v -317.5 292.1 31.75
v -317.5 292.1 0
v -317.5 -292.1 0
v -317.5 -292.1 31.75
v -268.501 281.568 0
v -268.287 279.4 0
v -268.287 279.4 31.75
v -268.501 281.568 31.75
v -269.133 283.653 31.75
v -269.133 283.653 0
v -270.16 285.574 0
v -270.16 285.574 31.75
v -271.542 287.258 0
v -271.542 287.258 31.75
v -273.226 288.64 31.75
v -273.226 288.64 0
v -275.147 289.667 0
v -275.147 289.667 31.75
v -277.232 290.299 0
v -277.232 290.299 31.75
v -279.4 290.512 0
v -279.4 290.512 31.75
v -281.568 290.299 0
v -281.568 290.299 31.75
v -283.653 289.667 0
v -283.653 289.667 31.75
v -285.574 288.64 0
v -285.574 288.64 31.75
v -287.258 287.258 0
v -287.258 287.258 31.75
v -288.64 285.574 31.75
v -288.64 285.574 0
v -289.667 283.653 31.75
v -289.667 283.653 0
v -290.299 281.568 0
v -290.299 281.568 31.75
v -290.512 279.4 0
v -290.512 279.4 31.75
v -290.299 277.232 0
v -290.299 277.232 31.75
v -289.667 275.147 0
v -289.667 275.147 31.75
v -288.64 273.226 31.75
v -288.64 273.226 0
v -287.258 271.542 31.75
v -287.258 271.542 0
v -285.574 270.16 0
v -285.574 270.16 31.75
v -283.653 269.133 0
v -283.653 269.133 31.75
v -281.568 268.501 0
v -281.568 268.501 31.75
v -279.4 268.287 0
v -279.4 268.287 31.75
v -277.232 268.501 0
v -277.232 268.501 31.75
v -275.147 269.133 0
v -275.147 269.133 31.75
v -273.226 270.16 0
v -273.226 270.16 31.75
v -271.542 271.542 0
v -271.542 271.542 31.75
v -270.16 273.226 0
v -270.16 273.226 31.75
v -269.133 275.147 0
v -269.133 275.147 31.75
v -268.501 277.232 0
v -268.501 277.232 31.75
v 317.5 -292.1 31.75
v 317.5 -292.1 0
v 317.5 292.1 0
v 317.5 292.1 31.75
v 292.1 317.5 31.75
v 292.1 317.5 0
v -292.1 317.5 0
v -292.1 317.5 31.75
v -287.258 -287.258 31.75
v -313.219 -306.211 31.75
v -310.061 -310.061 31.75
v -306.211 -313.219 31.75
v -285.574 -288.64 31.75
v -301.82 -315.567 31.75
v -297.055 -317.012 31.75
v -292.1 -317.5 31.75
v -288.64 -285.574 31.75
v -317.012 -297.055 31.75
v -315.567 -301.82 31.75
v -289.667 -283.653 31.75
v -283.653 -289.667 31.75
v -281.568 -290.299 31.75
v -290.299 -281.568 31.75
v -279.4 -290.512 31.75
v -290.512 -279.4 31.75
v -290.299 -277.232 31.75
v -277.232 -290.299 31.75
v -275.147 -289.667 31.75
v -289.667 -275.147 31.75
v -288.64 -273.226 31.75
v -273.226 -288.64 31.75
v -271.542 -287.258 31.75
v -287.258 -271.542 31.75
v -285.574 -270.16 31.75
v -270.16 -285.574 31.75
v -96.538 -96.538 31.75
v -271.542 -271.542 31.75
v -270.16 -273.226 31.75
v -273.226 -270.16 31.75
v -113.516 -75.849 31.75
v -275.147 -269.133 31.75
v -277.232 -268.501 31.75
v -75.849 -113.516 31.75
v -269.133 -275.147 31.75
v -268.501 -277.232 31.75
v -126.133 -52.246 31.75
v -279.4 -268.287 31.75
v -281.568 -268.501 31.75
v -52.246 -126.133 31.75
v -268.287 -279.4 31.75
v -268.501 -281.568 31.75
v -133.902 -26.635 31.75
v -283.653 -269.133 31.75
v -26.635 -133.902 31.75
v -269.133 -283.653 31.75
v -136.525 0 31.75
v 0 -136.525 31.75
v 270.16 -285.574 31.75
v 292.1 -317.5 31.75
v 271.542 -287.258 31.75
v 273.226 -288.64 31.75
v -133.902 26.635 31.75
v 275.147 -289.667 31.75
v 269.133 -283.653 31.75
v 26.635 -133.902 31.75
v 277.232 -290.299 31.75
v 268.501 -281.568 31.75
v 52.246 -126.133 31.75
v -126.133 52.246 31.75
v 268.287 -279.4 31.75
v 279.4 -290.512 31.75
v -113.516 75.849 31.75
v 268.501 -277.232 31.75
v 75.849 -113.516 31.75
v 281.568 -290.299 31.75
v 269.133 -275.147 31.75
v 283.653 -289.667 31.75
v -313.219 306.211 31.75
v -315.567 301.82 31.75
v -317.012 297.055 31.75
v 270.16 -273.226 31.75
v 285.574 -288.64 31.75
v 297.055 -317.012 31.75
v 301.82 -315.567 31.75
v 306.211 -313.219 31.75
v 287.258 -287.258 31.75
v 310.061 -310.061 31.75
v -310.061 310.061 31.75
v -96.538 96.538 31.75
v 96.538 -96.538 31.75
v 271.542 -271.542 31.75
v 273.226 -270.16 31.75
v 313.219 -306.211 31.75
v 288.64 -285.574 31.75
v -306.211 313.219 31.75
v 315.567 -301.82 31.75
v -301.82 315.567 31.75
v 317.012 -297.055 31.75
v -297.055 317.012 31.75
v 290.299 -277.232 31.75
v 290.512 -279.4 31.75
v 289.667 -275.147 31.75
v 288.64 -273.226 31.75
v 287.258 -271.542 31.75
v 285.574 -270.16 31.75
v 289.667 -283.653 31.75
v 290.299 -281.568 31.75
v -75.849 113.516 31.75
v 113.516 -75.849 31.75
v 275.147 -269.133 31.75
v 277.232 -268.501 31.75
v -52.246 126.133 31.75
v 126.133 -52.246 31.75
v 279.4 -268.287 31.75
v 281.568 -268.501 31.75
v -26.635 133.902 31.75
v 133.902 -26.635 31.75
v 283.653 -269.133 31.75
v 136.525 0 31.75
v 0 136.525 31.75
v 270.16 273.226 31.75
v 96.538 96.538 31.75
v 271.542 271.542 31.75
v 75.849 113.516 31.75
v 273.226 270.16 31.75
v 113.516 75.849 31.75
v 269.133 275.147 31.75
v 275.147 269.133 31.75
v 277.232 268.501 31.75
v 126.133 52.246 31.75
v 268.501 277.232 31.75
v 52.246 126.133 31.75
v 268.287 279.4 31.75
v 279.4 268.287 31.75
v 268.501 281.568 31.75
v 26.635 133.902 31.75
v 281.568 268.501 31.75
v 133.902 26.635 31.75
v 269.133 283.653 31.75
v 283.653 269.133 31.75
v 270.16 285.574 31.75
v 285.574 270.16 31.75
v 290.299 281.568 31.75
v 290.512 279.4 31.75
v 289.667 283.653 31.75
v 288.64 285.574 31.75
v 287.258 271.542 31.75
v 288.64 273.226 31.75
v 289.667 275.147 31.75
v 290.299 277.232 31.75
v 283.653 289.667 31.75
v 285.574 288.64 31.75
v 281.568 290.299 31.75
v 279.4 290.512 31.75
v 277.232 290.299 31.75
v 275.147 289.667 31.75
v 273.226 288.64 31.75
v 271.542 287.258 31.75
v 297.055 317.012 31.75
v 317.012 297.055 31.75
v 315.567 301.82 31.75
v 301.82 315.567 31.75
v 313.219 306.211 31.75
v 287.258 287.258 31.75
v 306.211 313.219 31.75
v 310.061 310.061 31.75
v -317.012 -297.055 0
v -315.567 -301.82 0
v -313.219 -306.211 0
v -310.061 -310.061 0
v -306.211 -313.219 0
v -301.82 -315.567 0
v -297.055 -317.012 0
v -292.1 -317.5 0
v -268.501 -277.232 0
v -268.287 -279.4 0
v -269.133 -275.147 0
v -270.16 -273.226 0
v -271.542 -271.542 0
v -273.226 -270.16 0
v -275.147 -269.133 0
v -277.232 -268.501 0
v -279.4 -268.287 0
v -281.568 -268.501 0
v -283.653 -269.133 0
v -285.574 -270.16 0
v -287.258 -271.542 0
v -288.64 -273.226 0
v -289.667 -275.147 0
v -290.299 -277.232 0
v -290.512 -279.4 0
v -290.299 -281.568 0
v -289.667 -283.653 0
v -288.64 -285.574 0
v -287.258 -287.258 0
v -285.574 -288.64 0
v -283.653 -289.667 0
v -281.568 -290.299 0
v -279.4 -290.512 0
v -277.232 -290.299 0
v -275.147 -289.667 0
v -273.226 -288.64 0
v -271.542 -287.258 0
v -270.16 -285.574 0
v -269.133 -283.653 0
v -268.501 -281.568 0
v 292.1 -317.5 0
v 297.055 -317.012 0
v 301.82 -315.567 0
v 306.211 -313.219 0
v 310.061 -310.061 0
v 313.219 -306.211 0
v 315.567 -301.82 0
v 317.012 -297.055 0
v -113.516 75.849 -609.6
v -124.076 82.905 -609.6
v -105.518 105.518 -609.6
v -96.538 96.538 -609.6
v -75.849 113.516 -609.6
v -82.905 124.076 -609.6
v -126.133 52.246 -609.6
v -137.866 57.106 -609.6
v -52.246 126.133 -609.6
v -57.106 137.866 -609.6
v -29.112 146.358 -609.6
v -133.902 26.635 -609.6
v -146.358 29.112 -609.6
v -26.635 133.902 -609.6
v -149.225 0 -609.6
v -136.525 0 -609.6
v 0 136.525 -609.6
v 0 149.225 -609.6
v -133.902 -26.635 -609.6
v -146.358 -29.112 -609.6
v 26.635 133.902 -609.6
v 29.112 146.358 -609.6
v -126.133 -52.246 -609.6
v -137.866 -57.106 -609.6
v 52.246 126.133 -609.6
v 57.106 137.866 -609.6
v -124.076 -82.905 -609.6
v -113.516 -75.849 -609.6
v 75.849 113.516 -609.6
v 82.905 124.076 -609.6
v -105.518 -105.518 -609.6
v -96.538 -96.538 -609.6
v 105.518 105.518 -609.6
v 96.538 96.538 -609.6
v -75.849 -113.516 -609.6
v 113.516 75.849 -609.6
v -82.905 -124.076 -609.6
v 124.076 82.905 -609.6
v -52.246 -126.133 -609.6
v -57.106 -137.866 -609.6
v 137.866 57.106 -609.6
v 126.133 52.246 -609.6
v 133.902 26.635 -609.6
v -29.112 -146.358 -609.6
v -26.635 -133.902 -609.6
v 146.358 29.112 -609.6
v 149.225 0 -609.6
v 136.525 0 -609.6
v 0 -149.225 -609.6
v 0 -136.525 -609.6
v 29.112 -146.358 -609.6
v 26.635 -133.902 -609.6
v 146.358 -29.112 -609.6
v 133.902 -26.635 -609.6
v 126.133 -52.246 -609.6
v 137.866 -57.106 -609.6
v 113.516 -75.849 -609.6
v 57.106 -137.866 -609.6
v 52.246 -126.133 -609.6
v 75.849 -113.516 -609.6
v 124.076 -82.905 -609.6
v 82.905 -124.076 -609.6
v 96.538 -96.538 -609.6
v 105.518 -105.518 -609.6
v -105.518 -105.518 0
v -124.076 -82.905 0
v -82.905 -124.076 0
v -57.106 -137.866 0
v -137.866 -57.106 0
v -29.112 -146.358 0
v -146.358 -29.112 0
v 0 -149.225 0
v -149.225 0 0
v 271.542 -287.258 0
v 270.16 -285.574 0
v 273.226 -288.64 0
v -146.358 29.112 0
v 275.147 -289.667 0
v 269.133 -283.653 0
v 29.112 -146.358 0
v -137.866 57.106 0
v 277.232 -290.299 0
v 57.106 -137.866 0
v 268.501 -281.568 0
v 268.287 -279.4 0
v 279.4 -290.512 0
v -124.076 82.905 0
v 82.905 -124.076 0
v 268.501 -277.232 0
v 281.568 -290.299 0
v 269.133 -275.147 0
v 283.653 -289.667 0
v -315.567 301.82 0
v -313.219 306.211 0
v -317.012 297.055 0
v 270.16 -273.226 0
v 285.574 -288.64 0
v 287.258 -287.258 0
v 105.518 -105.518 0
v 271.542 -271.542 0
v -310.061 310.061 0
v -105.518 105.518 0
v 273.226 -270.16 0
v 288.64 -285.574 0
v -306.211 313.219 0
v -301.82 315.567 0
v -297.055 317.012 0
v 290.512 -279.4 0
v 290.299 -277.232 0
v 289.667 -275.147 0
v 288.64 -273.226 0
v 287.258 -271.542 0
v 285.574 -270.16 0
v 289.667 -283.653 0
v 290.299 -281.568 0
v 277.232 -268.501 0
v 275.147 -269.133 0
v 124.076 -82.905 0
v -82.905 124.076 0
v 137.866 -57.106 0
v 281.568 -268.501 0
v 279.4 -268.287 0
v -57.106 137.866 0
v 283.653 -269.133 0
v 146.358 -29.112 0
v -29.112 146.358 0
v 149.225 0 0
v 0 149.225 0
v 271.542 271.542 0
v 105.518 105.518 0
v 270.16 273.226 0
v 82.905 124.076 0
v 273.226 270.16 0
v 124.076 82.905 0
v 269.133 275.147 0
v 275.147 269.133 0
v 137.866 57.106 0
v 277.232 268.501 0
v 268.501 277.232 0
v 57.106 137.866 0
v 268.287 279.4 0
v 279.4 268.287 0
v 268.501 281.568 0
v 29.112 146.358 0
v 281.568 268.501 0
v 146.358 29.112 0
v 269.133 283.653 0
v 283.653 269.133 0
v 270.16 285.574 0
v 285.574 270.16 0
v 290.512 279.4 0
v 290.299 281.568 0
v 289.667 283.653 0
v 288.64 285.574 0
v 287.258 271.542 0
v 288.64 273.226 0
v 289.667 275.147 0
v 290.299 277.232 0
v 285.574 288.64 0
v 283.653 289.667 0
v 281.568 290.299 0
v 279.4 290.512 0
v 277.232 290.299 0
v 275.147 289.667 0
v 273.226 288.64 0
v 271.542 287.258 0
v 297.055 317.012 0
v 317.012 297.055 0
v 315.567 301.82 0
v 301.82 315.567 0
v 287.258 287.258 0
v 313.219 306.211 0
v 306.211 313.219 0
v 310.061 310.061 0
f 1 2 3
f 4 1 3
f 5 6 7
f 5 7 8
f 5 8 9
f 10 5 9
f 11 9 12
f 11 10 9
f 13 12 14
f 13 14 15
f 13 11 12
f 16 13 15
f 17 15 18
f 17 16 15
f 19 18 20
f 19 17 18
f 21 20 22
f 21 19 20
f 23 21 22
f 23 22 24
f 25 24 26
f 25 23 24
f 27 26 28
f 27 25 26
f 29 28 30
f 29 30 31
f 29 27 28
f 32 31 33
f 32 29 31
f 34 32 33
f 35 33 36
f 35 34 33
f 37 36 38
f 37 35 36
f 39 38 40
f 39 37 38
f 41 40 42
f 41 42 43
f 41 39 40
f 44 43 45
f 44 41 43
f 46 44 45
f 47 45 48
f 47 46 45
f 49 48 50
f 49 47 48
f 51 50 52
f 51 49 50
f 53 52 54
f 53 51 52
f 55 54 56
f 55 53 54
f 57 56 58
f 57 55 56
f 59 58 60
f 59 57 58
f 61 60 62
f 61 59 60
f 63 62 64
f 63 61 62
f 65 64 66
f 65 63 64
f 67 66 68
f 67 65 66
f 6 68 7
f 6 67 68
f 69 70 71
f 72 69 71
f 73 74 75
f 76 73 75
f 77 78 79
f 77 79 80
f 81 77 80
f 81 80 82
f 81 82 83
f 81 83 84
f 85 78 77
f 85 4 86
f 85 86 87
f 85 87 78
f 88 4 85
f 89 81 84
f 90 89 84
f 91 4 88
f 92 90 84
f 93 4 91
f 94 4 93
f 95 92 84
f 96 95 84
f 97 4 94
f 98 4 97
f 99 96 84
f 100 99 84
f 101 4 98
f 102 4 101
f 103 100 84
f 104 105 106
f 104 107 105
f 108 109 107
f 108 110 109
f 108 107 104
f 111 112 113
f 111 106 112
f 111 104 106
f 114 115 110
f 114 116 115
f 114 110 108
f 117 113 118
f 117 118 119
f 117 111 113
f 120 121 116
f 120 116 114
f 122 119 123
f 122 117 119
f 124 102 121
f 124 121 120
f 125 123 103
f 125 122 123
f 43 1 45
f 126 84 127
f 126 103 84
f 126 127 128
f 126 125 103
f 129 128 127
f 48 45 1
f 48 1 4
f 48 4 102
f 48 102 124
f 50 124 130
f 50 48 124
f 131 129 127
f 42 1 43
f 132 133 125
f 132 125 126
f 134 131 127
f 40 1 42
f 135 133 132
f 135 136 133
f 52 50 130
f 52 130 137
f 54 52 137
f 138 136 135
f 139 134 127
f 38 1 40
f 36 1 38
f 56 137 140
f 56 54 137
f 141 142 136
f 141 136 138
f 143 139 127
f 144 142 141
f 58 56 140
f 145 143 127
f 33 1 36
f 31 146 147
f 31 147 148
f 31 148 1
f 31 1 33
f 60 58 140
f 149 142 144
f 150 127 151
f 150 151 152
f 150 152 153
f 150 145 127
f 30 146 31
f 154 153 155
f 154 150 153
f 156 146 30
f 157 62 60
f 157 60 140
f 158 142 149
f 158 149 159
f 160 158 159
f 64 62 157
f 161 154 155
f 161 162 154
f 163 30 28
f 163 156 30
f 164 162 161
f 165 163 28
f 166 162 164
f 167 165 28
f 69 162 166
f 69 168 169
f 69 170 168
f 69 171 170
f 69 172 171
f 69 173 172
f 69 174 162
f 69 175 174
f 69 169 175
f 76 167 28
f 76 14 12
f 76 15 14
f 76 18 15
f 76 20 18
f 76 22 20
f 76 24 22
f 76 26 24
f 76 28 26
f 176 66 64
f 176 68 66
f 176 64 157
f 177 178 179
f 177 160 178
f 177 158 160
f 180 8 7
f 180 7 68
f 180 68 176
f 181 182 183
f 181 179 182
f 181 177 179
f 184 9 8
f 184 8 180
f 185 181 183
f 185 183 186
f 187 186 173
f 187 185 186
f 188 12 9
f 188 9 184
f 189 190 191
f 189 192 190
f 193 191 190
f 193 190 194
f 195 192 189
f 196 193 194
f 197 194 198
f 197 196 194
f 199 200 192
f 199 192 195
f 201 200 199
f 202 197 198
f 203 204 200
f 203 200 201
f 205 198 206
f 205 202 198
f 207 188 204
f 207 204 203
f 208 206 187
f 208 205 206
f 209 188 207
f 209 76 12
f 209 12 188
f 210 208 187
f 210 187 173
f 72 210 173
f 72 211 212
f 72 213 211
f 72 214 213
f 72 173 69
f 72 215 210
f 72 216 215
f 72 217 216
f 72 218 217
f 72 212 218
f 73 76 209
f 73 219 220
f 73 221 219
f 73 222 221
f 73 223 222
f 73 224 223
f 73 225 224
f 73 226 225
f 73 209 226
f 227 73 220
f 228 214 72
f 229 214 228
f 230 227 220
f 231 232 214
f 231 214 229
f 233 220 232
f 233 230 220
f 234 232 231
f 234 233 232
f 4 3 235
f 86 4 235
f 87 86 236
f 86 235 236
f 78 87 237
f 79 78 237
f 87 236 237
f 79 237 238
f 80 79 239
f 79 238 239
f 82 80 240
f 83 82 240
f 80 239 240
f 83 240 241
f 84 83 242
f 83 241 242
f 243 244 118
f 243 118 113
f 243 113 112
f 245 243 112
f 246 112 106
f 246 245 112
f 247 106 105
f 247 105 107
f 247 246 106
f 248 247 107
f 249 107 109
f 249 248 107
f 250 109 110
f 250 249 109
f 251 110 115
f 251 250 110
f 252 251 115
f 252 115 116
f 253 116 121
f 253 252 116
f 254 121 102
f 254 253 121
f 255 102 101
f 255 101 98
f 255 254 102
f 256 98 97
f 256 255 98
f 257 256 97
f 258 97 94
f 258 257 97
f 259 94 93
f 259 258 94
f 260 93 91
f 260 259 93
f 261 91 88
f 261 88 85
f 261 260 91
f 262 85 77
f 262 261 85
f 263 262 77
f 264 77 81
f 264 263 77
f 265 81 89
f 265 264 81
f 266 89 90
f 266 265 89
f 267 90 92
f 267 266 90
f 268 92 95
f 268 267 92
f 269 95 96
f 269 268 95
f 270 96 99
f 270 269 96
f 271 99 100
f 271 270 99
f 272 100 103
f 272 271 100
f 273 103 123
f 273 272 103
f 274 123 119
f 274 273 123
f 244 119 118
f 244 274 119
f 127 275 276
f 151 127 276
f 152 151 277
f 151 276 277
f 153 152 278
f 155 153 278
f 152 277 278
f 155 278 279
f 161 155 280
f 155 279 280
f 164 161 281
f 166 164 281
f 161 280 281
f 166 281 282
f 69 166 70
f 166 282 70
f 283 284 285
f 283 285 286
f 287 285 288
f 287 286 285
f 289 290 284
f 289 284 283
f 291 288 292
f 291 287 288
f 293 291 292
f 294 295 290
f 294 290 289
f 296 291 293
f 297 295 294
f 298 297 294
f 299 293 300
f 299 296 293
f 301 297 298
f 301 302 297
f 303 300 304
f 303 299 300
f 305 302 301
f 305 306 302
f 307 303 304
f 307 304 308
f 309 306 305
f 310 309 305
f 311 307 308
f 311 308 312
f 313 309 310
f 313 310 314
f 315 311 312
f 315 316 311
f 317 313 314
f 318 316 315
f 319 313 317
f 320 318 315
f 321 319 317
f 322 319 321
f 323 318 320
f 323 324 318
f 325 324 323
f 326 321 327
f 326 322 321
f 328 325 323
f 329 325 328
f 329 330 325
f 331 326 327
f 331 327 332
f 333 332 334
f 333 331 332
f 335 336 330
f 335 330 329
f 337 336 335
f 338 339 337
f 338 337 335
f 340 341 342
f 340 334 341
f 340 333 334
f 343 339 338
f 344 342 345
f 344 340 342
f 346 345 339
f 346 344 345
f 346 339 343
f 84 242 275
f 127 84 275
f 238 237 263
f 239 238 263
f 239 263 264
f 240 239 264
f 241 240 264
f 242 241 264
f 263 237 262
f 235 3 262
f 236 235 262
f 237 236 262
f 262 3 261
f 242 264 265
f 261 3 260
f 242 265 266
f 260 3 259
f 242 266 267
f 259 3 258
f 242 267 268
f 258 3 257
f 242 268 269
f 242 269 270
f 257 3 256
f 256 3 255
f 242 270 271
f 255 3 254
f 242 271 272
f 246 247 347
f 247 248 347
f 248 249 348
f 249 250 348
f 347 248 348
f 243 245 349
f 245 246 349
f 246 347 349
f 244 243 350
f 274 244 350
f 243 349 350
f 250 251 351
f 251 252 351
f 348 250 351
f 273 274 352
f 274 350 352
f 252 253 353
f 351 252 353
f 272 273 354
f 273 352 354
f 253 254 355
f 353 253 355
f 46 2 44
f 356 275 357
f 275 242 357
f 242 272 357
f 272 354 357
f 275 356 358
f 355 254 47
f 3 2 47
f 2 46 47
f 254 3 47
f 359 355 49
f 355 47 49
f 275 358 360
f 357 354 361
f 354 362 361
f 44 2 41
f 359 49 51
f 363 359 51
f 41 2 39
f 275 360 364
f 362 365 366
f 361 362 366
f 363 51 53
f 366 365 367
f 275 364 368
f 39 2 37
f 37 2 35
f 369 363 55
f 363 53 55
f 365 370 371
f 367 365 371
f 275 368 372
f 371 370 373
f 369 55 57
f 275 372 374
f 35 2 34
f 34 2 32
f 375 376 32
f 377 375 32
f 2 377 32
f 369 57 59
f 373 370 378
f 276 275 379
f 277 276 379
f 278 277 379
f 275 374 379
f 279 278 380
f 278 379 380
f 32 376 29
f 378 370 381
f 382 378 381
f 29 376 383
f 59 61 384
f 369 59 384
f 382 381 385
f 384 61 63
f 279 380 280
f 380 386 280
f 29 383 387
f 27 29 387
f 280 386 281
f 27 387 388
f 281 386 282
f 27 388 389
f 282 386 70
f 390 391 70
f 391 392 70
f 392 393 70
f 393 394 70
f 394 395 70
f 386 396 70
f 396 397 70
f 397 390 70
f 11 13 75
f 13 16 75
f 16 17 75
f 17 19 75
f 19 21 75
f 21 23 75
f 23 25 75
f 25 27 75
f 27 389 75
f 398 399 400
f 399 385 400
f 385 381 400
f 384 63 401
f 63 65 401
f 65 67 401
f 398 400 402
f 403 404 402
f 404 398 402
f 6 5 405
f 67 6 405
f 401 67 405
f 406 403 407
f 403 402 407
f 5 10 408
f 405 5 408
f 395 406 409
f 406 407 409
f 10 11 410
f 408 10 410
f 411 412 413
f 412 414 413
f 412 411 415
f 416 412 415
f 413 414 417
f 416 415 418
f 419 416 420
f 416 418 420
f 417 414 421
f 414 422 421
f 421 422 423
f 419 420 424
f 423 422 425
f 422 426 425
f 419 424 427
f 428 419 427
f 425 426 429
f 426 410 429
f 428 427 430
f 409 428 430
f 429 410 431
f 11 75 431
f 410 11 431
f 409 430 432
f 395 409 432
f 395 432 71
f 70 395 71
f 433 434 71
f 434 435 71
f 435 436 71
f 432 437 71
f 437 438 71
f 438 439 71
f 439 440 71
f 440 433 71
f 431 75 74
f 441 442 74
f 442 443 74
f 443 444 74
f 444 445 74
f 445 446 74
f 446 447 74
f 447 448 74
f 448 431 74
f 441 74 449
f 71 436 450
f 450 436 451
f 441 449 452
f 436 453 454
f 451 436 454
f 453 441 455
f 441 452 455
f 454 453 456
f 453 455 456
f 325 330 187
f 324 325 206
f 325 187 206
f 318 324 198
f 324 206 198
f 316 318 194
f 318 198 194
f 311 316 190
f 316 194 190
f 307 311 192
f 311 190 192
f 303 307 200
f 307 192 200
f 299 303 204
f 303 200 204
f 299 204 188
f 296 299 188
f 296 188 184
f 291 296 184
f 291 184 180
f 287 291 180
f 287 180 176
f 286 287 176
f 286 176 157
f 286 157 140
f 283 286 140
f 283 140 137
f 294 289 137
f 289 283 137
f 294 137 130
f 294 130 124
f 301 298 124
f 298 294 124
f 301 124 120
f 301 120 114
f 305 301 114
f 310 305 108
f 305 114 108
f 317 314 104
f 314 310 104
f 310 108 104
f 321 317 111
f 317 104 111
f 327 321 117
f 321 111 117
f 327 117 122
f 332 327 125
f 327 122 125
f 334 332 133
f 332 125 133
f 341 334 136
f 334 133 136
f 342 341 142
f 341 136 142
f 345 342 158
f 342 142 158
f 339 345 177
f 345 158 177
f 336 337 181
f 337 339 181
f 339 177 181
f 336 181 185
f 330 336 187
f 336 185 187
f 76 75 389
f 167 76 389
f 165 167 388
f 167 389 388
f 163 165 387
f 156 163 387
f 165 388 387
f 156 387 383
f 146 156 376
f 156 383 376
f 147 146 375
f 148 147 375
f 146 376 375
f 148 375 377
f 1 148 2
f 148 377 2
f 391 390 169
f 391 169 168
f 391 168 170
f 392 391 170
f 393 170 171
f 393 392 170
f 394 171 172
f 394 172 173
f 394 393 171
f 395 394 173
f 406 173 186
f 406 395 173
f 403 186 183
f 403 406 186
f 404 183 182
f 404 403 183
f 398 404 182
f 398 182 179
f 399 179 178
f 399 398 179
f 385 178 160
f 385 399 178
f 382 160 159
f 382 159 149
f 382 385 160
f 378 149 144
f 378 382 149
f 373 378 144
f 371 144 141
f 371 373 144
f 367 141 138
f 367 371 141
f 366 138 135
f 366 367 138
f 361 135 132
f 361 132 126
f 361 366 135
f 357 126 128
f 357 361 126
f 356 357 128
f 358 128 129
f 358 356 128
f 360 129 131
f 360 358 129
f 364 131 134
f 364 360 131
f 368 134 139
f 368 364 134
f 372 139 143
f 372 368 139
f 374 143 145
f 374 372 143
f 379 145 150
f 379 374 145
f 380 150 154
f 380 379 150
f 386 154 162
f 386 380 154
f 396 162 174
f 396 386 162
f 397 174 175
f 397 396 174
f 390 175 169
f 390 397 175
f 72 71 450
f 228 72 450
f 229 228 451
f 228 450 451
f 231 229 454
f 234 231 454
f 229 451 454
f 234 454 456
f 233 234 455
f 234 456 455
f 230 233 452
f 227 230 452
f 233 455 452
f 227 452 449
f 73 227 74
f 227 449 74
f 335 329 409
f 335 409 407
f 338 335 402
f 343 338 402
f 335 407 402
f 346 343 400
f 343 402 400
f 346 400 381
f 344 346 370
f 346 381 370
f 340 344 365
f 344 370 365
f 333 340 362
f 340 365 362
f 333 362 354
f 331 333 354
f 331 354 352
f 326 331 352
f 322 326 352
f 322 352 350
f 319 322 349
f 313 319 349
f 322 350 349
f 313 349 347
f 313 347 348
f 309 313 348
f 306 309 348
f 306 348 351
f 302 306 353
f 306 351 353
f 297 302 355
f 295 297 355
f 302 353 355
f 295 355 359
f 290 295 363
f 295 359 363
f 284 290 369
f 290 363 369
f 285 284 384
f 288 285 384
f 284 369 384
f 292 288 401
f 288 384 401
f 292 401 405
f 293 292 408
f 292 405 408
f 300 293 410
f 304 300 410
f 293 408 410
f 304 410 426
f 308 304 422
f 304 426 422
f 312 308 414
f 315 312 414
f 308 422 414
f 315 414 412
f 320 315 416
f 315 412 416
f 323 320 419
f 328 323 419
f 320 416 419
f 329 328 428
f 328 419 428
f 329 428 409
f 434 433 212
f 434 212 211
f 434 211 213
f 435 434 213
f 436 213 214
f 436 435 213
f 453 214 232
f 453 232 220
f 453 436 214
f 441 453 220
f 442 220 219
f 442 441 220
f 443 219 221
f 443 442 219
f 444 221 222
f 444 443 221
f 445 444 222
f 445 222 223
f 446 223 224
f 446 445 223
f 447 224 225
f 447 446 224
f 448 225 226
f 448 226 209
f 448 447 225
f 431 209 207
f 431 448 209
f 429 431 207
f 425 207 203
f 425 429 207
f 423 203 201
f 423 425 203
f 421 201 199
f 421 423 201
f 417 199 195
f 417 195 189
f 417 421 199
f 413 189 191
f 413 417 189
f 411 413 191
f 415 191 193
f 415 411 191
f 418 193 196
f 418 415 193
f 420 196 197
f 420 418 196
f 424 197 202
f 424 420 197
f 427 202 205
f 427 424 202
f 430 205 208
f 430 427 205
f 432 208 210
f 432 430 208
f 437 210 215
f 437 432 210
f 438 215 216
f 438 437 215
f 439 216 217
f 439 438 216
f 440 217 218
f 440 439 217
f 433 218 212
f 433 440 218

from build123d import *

# Parameters (mm, degrees)
F0_R     = 11.1125
F1_DEPTH = 31.75
F2_R     = 149.225
F2_R_2   = 136.525
F3_DEPTH = 609.6
F4_R     = 136.525
F5_DEPTH = 50.8


with BuildPart() as f1:
    # F0 (on Top) → F1 (new body)
    with BuildSketch(Plane.XY):
        with BuildLine():
            ThreePointArc((317.5, 292.1), (310.060512, 310.060512), (292.1, 317.5))
            Line((292.1, 317.5), (-292.1, 317.5))
            ThreePointArc((-292.1, 317.5), (-310.060512, 310.060512), (-317.5, 292.1))
            Line((-317.5, 292.1), (-317.5, -292.1))
            ThreePointArc((-317.5, -292.1), (-310.060512, -310.060512), (-292.1, -317.5))
            Line((-292.1, -317.5), (292.1, -317.5))
            ThreePointArc((292.1, -317.5), (310.060512, -310.060512), (317.5, -292.1))
            Line((317.5, -292.1), (317.5, 292.1))
        make_face()
        with Locations((-279.4, -279.4)):
            Circle(F0_R, mode=Mode.SUBTRACT)
        with Locations((279.4, -279.4)):
            Circle(F0_R, mode=Mode.SUBTRACT)
        with Locations((-279.4, 279.4)):
            Circle(F0_R, mode=Mode.SUBTRACT)
        with Locations((279.4, 279.4)):
            Circle(F0_R, mode=Mode.SUBTRACT)
    extrude(amount=F1_DEPTH)

    # F2 (on face) → F3 (join)
    with BuildSketch(Plane(origin=(0, 0, 0), x_dir=(1, 0, 0), z_dir=(0, 0, -1))):
        Circle(F2_R)
        Circle(F2_R_2, mode=Mode.SUBTRACT)
    extrude(amount=F3_DEPTH)

    # F4 (on face) → F5 (cut)
    with BuildSketch(Plane.XY.offset(31.75)):
        Circle(F4_R)
    extrude(amount=-F5_DEPTH, mode=Mode.SUBTRACT)


solid = f1.part
